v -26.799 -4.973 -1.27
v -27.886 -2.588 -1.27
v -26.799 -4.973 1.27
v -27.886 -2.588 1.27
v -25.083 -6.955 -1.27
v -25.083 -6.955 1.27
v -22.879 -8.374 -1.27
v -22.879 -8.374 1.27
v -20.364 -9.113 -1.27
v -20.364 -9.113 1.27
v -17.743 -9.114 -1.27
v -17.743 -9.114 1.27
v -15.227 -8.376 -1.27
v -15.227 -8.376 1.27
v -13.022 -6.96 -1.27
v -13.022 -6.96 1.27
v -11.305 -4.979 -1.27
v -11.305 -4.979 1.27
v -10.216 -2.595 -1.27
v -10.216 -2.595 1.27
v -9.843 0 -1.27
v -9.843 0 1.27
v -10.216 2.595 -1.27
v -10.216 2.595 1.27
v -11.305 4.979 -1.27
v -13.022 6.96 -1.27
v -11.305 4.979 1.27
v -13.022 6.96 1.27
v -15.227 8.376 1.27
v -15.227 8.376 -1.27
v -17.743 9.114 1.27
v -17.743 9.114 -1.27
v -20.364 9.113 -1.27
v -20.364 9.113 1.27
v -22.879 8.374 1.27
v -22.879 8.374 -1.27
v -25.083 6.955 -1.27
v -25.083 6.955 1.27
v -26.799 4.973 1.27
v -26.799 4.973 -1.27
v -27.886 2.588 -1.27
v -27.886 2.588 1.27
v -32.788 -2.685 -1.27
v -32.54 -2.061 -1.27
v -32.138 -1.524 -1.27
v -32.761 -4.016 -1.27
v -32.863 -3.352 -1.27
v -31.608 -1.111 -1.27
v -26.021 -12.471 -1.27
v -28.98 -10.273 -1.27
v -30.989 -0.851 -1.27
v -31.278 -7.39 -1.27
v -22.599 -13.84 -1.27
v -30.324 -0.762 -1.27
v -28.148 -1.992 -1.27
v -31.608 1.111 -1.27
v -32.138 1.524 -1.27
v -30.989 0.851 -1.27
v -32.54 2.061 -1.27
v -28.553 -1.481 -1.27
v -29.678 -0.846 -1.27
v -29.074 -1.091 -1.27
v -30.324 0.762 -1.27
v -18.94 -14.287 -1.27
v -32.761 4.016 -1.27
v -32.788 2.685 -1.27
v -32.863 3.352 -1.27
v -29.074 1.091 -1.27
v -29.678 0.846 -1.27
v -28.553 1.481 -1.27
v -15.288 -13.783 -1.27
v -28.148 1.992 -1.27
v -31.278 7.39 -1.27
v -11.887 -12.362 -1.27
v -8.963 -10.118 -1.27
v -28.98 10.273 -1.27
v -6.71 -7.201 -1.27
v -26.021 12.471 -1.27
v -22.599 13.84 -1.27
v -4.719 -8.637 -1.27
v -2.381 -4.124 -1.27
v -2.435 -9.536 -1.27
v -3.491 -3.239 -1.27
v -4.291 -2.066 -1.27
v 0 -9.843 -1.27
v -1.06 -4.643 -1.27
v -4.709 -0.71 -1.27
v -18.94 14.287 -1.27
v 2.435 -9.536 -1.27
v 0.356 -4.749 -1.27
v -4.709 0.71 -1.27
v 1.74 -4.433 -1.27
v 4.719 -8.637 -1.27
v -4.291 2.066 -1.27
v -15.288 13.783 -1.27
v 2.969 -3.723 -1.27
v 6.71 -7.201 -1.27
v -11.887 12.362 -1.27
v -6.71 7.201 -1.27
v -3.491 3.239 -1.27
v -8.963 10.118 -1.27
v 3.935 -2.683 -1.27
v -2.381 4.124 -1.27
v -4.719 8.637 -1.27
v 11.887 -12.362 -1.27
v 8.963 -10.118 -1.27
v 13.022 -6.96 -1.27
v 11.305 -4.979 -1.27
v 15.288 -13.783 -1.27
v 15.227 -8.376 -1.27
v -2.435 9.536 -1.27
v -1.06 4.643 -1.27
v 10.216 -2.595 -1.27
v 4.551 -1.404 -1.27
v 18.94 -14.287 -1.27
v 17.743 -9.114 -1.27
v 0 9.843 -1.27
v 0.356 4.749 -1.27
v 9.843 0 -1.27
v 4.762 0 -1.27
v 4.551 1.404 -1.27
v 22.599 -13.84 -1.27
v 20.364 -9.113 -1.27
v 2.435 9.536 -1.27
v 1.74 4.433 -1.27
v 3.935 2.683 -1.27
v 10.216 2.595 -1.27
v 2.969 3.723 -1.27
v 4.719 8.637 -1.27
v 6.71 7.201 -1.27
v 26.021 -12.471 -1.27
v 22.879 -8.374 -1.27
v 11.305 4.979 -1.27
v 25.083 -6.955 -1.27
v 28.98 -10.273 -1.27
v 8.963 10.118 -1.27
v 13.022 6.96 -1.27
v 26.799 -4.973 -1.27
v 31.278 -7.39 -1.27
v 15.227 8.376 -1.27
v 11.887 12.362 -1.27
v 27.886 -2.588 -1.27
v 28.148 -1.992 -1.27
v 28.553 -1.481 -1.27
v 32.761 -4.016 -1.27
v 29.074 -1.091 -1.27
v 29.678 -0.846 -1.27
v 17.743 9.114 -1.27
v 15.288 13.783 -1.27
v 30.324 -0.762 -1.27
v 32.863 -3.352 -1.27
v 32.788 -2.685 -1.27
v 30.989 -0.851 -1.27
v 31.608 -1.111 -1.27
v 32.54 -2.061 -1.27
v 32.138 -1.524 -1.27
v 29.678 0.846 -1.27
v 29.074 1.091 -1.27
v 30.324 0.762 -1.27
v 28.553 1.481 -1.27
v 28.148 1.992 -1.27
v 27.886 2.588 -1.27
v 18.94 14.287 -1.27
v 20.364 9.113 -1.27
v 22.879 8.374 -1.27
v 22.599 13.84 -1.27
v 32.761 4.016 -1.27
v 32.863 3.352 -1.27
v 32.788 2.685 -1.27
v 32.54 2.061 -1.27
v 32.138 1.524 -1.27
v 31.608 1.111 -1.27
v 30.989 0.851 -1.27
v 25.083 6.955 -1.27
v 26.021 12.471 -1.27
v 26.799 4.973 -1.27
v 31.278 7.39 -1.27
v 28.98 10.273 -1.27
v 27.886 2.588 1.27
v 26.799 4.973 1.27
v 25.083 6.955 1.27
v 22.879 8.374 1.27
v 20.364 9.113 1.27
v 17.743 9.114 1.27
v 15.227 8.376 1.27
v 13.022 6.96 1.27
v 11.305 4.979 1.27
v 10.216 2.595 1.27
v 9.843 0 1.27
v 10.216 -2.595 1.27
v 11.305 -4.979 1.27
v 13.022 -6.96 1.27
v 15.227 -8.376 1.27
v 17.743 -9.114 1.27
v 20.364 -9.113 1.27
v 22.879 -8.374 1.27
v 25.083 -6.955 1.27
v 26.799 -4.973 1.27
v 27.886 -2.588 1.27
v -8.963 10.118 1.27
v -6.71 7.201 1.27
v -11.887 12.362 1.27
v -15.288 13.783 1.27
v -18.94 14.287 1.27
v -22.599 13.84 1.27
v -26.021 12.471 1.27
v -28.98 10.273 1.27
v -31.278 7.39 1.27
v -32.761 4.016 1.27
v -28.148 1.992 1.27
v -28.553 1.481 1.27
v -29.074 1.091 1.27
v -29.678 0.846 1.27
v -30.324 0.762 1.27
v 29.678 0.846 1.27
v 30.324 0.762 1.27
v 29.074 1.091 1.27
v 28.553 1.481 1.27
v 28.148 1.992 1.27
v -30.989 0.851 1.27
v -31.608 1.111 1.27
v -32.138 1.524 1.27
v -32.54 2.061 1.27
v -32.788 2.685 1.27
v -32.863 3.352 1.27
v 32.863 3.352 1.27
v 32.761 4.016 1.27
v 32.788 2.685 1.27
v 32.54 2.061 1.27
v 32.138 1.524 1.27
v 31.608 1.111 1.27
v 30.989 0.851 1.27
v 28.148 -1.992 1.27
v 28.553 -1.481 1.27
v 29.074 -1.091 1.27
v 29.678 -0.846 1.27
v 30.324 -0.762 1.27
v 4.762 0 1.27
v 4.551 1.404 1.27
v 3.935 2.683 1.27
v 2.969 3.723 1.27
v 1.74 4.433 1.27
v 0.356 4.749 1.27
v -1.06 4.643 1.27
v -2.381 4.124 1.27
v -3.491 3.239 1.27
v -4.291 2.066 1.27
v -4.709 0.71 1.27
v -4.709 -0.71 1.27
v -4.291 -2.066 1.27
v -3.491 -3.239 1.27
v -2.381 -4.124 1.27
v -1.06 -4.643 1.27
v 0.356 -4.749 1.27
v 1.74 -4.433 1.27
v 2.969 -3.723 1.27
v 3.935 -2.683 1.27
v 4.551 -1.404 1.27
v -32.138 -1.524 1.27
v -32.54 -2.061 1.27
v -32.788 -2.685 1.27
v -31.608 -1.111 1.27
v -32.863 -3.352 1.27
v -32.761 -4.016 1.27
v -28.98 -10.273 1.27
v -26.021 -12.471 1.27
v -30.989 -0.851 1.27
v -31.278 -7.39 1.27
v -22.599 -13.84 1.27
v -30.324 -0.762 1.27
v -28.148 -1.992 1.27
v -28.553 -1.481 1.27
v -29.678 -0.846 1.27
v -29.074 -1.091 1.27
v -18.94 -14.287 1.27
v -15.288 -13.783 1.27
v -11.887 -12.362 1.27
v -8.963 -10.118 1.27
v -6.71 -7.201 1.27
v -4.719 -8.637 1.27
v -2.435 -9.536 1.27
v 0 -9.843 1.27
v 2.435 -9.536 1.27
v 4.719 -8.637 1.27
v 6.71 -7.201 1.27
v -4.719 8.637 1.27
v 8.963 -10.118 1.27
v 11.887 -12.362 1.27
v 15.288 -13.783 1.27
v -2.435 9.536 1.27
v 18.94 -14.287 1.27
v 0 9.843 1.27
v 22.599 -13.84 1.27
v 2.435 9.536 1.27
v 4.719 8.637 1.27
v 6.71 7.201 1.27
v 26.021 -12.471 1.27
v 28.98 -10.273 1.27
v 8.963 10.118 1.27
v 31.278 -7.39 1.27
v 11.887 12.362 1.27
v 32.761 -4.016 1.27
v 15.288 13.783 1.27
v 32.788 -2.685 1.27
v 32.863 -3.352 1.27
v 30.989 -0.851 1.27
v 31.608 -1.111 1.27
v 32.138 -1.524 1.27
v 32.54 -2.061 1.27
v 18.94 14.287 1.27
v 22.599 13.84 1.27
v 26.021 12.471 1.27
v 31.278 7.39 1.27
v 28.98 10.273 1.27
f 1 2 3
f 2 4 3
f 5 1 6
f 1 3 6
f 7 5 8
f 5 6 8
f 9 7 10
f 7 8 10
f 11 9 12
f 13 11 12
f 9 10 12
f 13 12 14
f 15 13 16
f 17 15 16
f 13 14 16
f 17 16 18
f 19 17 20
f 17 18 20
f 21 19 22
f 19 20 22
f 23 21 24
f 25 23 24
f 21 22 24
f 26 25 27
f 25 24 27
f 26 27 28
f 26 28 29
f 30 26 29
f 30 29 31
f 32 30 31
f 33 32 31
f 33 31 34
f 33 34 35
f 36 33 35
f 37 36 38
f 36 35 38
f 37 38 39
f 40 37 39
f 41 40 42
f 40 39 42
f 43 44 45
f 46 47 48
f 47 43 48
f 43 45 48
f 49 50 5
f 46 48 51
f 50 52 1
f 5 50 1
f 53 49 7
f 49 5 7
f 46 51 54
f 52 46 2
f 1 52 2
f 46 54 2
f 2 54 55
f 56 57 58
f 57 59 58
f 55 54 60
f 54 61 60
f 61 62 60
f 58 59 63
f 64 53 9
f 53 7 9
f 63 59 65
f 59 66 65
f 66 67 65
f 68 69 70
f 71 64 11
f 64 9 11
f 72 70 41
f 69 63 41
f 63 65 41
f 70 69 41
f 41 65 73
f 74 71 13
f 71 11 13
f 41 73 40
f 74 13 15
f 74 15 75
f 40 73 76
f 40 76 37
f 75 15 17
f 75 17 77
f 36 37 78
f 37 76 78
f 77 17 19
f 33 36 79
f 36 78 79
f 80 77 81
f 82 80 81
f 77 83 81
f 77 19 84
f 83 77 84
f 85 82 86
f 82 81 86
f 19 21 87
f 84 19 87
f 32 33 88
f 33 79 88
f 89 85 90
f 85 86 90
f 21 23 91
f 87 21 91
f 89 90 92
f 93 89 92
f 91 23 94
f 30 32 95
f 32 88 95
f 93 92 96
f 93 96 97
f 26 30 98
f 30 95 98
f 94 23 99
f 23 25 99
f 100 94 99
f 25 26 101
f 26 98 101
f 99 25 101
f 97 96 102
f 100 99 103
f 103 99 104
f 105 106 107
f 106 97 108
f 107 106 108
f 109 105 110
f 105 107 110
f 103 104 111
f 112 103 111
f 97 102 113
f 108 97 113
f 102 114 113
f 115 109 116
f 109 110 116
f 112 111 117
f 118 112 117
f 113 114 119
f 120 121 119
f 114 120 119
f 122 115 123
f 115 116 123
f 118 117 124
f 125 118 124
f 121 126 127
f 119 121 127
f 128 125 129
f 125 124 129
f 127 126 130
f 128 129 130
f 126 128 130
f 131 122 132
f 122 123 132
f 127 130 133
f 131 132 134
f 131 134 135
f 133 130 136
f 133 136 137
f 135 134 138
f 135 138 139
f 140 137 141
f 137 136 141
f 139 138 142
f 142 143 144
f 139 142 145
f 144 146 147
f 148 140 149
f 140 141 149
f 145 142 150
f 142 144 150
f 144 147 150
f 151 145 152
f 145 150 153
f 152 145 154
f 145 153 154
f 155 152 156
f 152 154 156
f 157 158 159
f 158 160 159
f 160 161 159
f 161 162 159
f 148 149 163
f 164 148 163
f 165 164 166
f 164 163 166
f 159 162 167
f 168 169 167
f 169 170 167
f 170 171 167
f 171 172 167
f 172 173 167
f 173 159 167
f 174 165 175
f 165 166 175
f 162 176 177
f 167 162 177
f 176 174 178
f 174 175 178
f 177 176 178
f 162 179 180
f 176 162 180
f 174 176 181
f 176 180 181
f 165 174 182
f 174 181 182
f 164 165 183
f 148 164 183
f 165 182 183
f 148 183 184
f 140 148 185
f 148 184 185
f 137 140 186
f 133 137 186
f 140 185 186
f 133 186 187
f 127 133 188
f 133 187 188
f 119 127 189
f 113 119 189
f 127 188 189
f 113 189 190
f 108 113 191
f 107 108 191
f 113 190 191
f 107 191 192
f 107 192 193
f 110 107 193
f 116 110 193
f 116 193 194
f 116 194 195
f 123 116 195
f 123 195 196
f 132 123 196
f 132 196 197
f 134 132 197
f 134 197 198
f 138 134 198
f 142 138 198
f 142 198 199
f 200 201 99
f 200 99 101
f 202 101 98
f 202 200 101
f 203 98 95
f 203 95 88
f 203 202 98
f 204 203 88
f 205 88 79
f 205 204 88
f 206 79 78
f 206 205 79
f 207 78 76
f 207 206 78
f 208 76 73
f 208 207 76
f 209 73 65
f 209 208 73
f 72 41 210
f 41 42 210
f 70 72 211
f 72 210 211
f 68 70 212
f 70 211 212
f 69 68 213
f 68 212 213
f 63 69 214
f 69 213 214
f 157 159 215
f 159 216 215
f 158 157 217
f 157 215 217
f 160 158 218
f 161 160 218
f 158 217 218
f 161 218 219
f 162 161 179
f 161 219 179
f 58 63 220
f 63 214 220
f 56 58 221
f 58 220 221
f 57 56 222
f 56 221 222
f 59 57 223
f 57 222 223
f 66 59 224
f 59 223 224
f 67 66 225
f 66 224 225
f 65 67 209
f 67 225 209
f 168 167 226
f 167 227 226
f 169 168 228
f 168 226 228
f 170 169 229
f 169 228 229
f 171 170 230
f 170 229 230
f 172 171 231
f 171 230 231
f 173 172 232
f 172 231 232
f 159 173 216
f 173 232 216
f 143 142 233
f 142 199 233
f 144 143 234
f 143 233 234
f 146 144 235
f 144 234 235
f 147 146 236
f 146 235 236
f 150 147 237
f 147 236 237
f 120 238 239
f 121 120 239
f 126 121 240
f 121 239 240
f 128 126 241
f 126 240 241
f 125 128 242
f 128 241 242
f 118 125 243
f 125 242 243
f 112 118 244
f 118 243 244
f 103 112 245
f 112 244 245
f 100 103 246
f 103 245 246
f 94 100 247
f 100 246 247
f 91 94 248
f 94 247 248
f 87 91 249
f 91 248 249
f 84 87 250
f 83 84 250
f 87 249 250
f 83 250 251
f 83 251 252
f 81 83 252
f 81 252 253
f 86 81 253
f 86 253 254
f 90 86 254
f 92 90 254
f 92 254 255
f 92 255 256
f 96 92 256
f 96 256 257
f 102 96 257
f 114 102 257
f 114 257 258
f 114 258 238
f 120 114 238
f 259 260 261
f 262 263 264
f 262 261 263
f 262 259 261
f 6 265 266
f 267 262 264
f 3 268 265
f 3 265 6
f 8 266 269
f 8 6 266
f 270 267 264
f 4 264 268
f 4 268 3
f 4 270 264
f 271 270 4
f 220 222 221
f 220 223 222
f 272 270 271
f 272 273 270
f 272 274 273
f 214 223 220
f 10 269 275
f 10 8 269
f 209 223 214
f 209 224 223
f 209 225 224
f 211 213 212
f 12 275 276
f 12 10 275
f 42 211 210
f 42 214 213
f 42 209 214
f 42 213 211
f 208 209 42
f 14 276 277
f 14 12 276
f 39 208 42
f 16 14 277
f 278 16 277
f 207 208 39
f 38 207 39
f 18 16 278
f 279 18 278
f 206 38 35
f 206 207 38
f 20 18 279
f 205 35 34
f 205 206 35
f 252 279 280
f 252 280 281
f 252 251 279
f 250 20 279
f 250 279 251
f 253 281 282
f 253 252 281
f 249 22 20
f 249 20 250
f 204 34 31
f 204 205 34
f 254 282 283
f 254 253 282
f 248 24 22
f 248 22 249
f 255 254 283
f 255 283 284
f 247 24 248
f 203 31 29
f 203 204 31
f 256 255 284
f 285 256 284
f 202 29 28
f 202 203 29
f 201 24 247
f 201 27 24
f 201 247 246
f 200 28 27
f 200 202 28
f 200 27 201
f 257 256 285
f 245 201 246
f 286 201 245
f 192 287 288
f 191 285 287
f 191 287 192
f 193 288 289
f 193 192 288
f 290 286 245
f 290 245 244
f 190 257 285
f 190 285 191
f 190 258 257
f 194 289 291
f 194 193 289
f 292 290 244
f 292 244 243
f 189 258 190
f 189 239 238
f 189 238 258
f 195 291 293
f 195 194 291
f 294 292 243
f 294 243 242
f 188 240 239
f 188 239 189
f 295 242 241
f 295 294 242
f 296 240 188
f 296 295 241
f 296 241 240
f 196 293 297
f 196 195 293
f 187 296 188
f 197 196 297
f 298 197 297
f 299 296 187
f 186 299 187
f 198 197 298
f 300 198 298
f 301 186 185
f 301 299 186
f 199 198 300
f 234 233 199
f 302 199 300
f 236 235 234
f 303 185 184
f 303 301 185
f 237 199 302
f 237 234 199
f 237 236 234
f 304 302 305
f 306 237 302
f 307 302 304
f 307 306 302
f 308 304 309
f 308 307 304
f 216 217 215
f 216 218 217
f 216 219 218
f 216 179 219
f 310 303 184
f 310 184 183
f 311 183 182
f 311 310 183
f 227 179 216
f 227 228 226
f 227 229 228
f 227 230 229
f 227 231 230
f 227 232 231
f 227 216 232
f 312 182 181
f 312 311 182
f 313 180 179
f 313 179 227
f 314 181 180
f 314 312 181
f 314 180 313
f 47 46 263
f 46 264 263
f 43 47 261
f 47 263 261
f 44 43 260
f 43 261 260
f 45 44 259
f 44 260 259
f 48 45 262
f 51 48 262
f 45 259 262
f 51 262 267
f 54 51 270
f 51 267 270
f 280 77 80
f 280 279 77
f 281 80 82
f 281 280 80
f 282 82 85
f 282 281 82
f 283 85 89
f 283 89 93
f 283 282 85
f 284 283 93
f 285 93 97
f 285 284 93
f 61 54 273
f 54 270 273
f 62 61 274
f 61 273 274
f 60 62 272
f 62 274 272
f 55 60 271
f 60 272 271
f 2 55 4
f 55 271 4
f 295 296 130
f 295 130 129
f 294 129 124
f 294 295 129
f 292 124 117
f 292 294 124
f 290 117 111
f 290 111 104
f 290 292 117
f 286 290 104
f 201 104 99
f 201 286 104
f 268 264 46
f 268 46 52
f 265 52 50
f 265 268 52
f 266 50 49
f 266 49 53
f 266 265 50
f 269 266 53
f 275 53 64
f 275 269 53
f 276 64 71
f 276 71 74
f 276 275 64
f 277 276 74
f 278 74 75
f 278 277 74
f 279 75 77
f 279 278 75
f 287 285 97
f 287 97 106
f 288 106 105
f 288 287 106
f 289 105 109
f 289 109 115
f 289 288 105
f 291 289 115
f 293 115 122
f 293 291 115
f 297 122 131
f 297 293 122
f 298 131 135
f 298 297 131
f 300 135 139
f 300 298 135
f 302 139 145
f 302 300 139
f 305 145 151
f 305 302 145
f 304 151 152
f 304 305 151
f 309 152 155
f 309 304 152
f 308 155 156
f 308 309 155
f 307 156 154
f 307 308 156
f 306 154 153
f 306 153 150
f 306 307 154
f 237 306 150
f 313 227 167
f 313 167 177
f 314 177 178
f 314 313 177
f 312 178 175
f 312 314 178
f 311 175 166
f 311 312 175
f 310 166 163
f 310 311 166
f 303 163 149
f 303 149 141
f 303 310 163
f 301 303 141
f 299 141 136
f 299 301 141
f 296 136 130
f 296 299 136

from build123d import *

# Parameters (mm, degrees)
F1_DEPTH = 1.27
F2_R     = 9.2075
F2_R_2   = 4.7625
F3_DEPTH = 25.4
F4_W     = 16.7551115155
F4_H     = 1.524
F5_DEPTH = 25.4
F6_R     = 2.53999


# Not quite as in the source:
# - a fillet or chamfer is up to 0.001 mm smaller than in the source, because OpenCascade refuses the exact size


with BuildPart() as f1:
    # F0 (on Top) → F1 (new body, symmetric)
    with BuildSketch(Plane.XY):
        with BuildLine():
            ThreePointArc((-6.7098333333, -7.2008987556), (-5.2579227906, -3.7297804895), (-4.7625, 0))
            ThreePointArc((-4.7625, 0), (-5.2579227906, 3.7297804895), (-6.7098333333, 7.2008987556))
            ThreePointArc((-6.7098333333, 7.2008987556), (-9.8425, 0), (-6.7098333333, -7.2008987556))
        make_face()
        with BuildLine():
            ThreePointArc((-6.7098333333, 7.2008987556), (-5.2579227906, 3.7297804895), (-4.7625, 0))
            ThreePointArc((-4.7625, 0), (-5.2579227906, -3.7297804895), (-6.7098333333, -7.2008987556))
            ThreePointArc((-6.7098333333, -7.2008987556), (0, -9.8425), (6.7098333333, -7.2008987556))
            ThreePointArc((6.7098333333, -7.2008987556), (4.7625, 0), (6.7098333333, 7.2008987556))
            ThreePointArc((6.7098333333, 7.2008987556), (0, 9.8425), (-6.7098333333, 7.2008987556))
        make_face()
        with BuildLine():
            ThreePointArc((-6.7098333333, -7.2008987556), (-9.8425, 0), (-6.7098333333, 7.2008987556))
            ThreePointArc((-6.7098333333, 7.2008987556), (-33.3375, 0), (-6.7098333333, -7.2008987556))
        make_face()
        with BuildLine():
            ThreePointArc((9.8425, 0), (9.0254180189, 3.9264024034), (6.7098333333, 7.2008987556))
            ThreePointArc((6.7098333333, 7.2008987556), (4.7625, 0), (6.7098333333, -7.2008987556))
            ThreePointArc((6.7098333333, -7.2008987556), (9.0254180189, -3.9264024034), (9.8425, 0))
        make_face()
        with BuildLine():
            ThreePointArc((33.3375, 0), (22.7797804895, 13.7920772094), (6.7098333333, 7.2008987556))
            ThreePointArc((6.7098333333, 7.2008987556), (9.0254180189, 3.9264024034), (9.8425, 0))
            ThreePointArc((9.8425, 0), (9.0254180189, -3.9264024034), (6.7098333333, -7.2008987556))
            ThreePointArc((6.7098333333, -7.2008987556), (22.7797804895, -13.7920772094), (33.3375, 0))
        make_face()
    extrude(amount=F1_DEPTH, both=True)

    # F2 (on face) → F3 (cut)
    with BuildSketch(Plane.XY.offset(1.27)):
        with Locations((-19.05, 0)):
            Circle(F2_R)
        with Locations((19.05, 0)):
            Circle(F2_R)
        Circle(F2_R_2)
    extrude(amount=-F3_DEPTH, mode=Mode.SUBTRACT)

    # F4 (on face) → F5 (cut)
    with BuildSketch(Plane.XY.offset(1.27)):
        with Locations((-24.9599442422, 0)):
            Rectangle(F4_W, F4_H)
        with Locations((24.9599442422, 0)):
            Rectangle(F4_W, F4_H)
    extrude(amount=-F5_DEPTH, mode=Mode.SUBTRACT)

    # F6 (radius 2.54 in the source; OpenCascade refuses exactly that, so slightly less here)
    f6_edges = [f1.edges().sort_by_distance(p)[0] for p in [
        (-33.317166, 0.762, 0),
        (-28.225915, 0.762, 0),
        (-28.225915, -0.762, 0),
        (-33.317166, -0.762, 0),
        (28.225915, -0.762, 0),
        (28.225915, 0.762, 0),
        (33.317166, 0.762, 0),
        (33.317166, -0.762, 0),
    ]]
    fillet(f6_edges, radius=F6_R)


solid = f1.part
